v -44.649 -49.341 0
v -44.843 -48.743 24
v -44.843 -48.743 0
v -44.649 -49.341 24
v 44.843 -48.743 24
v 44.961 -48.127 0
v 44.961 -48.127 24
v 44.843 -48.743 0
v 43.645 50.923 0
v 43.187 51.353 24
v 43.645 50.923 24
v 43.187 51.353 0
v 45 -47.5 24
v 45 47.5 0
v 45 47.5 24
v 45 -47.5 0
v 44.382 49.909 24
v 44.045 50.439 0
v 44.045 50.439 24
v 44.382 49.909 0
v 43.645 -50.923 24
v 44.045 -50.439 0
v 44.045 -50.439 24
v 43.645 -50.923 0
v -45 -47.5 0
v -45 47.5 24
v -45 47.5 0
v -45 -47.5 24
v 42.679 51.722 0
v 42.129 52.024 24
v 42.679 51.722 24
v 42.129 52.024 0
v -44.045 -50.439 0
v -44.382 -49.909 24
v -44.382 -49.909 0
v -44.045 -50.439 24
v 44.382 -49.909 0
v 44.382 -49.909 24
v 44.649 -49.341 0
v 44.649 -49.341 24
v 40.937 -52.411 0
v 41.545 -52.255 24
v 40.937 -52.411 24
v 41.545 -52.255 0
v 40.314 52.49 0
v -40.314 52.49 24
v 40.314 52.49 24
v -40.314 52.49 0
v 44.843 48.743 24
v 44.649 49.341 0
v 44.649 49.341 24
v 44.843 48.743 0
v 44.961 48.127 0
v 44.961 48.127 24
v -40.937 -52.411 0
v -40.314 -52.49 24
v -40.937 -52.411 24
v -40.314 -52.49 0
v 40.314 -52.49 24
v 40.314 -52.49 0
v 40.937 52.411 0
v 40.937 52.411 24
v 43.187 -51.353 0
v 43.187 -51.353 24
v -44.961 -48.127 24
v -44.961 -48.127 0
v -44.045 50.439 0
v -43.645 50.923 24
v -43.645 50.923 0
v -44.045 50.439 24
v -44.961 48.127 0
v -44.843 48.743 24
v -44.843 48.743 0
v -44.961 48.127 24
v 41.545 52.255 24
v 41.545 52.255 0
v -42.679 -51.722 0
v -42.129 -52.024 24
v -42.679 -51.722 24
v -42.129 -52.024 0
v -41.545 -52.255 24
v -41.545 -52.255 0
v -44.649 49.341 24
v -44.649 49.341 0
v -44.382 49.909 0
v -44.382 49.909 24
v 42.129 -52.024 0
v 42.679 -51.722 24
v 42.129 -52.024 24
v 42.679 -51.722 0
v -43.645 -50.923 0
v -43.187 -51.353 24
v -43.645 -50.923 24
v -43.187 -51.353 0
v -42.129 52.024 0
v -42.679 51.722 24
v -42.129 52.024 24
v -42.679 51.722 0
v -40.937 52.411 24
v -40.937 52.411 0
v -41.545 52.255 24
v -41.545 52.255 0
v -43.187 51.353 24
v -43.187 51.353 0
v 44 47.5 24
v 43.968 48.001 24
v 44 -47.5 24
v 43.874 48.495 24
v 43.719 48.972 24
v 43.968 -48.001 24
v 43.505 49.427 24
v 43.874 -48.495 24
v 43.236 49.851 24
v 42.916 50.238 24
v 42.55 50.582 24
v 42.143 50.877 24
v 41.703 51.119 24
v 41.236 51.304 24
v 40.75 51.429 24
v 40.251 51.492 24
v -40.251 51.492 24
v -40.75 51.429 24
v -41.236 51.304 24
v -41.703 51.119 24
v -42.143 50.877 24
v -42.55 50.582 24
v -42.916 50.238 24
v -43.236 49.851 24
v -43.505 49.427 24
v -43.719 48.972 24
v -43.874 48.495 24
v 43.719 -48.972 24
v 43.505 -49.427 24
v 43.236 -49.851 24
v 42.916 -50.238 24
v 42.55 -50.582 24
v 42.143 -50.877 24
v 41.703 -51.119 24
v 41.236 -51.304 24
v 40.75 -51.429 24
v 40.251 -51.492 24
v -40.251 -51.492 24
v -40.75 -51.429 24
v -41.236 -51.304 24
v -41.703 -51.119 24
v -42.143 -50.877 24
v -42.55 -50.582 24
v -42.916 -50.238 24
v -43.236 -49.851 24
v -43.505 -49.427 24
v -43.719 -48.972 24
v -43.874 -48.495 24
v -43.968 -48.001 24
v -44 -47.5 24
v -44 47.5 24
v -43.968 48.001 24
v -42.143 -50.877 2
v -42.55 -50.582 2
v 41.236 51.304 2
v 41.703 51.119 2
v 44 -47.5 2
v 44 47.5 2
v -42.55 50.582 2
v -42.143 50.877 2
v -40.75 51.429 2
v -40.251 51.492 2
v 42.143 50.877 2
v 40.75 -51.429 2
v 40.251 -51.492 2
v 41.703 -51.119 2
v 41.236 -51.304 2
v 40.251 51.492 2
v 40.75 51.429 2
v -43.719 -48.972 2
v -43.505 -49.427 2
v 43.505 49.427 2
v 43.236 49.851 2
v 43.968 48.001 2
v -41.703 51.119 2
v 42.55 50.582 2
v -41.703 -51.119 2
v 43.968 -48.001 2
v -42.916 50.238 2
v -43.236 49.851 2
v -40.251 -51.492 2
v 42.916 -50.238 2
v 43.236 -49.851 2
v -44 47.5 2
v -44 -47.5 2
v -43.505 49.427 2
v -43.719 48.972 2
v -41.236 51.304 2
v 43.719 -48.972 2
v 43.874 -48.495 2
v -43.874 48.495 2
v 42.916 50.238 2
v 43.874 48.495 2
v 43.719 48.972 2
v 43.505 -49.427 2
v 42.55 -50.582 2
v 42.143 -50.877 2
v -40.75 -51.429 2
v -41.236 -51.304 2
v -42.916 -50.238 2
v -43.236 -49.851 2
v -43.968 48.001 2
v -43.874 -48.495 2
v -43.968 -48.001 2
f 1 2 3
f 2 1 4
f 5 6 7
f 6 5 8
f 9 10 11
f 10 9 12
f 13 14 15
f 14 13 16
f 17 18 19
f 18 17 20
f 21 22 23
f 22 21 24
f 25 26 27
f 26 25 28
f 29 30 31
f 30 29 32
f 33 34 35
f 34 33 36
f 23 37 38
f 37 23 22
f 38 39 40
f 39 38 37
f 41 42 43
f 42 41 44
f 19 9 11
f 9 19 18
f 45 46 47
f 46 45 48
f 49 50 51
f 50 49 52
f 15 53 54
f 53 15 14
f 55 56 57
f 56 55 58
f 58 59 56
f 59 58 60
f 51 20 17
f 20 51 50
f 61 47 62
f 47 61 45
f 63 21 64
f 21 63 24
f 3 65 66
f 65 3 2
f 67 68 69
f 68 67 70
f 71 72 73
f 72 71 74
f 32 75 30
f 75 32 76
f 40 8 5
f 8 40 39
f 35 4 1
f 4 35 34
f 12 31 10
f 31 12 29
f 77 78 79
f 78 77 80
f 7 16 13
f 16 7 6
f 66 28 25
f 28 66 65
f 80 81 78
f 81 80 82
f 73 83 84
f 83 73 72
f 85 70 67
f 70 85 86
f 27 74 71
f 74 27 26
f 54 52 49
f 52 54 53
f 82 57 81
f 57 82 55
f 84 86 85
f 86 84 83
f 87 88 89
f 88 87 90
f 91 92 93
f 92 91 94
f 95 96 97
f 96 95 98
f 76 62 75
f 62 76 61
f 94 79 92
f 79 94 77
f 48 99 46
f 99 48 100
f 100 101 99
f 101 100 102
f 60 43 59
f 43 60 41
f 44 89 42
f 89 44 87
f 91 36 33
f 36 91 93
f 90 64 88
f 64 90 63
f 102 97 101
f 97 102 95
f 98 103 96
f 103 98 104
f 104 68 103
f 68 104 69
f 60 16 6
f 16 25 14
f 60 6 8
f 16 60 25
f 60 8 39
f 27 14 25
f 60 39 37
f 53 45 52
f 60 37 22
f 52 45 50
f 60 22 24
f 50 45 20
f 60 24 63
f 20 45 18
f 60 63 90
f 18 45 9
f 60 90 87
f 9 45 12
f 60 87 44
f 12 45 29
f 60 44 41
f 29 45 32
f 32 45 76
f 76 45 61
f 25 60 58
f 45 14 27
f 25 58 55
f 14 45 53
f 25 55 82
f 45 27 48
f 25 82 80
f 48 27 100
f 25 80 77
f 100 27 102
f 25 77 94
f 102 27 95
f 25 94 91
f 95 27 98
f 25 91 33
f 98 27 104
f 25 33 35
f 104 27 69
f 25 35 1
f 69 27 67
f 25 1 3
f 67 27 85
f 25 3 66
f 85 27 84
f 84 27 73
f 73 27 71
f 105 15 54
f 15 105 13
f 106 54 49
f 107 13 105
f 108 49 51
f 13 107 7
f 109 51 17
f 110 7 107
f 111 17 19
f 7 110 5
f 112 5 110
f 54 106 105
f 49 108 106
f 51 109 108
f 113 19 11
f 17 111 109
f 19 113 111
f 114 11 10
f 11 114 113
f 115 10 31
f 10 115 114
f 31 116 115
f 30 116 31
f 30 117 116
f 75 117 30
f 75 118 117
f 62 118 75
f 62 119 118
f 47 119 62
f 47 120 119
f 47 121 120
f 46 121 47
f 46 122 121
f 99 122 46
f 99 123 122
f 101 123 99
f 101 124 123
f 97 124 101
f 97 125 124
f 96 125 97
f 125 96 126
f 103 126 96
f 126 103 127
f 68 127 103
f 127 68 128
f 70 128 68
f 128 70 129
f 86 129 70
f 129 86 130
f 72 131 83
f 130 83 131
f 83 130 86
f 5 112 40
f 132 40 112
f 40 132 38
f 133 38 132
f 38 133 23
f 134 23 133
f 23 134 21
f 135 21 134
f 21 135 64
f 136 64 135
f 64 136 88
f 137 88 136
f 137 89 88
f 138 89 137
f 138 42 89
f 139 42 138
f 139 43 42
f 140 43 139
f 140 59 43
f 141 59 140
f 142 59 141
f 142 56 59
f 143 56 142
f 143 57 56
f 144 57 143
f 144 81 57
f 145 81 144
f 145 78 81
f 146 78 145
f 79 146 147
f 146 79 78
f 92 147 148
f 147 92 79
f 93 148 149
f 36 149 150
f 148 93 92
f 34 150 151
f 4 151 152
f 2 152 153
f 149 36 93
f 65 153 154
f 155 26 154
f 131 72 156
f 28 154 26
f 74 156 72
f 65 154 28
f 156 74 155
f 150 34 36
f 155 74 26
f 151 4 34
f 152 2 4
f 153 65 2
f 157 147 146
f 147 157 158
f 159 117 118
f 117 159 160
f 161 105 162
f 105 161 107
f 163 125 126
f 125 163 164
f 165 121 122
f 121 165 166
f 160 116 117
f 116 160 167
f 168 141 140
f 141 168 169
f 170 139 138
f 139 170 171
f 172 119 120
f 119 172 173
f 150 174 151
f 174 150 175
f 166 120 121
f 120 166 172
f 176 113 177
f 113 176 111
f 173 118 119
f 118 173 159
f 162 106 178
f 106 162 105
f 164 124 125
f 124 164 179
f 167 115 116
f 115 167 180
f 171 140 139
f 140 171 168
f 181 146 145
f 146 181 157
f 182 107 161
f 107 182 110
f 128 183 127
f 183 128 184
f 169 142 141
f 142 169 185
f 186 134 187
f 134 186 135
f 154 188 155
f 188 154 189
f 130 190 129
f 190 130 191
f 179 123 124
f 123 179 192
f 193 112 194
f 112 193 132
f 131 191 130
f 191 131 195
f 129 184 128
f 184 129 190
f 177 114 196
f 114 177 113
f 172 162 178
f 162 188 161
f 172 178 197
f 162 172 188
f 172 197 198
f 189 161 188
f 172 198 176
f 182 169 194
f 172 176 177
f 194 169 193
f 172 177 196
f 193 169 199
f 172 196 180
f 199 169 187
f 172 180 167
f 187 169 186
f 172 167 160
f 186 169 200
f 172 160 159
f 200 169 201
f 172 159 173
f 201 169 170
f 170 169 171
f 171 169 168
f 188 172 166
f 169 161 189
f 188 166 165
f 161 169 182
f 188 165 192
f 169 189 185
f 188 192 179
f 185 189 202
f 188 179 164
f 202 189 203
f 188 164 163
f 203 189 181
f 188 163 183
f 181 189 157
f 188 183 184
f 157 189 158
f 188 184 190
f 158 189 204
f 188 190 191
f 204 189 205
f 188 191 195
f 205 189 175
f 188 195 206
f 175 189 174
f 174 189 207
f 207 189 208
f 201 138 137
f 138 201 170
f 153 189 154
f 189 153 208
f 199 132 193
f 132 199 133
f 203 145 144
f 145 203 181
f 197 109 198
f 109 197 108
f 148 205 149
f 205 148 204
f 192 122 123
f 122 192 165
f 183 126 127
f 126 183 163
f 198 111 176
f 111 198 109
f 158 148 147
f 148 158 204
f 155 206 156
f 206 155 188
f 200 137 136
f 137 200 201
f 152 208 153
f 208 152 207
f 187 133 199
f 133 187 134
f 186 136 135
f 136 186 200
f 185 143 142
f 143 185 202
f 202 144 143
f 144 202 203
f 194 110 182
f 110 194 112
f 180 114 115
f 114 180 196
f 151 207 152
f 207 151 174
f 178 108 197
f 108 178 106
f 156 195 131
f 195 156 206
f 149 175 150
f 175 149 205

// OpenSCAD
$fn = 50;


difference() {
	union() {
		hull() {
			translate(v = [-40.0000000000, 47.5000000000, 0]) {
				cylinder(h = 24, r = 5);
			}
			translate(v = [40.0000000000, 47.5000000000, 0]) {
				cylinder(h = 24, r = 5);
			}
			translate(v = [-40.0000000000, -47.5000000000, 0]) {
				cylinder(h = 24, r = 5);
			}
			translate(v = [40.0000000000, -47.5000000000, 0]) {
				cylinder(h = 24, r = 5);
			}
		}
	}
	union() {
		translate(v = [0, 0, 2]) {
			hull() {
				translate(v = [-40.0000000000, 47.5000000000, 0]) {
					cylinder(h = 22, r = 4);
				}
				translate(v = [40.0000000000, 47.5000000000, 0]) {
					cylinder(h = 22, r = 4);
				}
				translate(v = [-40.0000000000, -47.5000000000, 0]) {
					cylinder(h = 22, r = 4);
				}
				translate(v = [40.0000000000, -47.5000000000, 0]) {
					cylinder(h = 22, r = 4);
				}
			}
		}
	}
}
